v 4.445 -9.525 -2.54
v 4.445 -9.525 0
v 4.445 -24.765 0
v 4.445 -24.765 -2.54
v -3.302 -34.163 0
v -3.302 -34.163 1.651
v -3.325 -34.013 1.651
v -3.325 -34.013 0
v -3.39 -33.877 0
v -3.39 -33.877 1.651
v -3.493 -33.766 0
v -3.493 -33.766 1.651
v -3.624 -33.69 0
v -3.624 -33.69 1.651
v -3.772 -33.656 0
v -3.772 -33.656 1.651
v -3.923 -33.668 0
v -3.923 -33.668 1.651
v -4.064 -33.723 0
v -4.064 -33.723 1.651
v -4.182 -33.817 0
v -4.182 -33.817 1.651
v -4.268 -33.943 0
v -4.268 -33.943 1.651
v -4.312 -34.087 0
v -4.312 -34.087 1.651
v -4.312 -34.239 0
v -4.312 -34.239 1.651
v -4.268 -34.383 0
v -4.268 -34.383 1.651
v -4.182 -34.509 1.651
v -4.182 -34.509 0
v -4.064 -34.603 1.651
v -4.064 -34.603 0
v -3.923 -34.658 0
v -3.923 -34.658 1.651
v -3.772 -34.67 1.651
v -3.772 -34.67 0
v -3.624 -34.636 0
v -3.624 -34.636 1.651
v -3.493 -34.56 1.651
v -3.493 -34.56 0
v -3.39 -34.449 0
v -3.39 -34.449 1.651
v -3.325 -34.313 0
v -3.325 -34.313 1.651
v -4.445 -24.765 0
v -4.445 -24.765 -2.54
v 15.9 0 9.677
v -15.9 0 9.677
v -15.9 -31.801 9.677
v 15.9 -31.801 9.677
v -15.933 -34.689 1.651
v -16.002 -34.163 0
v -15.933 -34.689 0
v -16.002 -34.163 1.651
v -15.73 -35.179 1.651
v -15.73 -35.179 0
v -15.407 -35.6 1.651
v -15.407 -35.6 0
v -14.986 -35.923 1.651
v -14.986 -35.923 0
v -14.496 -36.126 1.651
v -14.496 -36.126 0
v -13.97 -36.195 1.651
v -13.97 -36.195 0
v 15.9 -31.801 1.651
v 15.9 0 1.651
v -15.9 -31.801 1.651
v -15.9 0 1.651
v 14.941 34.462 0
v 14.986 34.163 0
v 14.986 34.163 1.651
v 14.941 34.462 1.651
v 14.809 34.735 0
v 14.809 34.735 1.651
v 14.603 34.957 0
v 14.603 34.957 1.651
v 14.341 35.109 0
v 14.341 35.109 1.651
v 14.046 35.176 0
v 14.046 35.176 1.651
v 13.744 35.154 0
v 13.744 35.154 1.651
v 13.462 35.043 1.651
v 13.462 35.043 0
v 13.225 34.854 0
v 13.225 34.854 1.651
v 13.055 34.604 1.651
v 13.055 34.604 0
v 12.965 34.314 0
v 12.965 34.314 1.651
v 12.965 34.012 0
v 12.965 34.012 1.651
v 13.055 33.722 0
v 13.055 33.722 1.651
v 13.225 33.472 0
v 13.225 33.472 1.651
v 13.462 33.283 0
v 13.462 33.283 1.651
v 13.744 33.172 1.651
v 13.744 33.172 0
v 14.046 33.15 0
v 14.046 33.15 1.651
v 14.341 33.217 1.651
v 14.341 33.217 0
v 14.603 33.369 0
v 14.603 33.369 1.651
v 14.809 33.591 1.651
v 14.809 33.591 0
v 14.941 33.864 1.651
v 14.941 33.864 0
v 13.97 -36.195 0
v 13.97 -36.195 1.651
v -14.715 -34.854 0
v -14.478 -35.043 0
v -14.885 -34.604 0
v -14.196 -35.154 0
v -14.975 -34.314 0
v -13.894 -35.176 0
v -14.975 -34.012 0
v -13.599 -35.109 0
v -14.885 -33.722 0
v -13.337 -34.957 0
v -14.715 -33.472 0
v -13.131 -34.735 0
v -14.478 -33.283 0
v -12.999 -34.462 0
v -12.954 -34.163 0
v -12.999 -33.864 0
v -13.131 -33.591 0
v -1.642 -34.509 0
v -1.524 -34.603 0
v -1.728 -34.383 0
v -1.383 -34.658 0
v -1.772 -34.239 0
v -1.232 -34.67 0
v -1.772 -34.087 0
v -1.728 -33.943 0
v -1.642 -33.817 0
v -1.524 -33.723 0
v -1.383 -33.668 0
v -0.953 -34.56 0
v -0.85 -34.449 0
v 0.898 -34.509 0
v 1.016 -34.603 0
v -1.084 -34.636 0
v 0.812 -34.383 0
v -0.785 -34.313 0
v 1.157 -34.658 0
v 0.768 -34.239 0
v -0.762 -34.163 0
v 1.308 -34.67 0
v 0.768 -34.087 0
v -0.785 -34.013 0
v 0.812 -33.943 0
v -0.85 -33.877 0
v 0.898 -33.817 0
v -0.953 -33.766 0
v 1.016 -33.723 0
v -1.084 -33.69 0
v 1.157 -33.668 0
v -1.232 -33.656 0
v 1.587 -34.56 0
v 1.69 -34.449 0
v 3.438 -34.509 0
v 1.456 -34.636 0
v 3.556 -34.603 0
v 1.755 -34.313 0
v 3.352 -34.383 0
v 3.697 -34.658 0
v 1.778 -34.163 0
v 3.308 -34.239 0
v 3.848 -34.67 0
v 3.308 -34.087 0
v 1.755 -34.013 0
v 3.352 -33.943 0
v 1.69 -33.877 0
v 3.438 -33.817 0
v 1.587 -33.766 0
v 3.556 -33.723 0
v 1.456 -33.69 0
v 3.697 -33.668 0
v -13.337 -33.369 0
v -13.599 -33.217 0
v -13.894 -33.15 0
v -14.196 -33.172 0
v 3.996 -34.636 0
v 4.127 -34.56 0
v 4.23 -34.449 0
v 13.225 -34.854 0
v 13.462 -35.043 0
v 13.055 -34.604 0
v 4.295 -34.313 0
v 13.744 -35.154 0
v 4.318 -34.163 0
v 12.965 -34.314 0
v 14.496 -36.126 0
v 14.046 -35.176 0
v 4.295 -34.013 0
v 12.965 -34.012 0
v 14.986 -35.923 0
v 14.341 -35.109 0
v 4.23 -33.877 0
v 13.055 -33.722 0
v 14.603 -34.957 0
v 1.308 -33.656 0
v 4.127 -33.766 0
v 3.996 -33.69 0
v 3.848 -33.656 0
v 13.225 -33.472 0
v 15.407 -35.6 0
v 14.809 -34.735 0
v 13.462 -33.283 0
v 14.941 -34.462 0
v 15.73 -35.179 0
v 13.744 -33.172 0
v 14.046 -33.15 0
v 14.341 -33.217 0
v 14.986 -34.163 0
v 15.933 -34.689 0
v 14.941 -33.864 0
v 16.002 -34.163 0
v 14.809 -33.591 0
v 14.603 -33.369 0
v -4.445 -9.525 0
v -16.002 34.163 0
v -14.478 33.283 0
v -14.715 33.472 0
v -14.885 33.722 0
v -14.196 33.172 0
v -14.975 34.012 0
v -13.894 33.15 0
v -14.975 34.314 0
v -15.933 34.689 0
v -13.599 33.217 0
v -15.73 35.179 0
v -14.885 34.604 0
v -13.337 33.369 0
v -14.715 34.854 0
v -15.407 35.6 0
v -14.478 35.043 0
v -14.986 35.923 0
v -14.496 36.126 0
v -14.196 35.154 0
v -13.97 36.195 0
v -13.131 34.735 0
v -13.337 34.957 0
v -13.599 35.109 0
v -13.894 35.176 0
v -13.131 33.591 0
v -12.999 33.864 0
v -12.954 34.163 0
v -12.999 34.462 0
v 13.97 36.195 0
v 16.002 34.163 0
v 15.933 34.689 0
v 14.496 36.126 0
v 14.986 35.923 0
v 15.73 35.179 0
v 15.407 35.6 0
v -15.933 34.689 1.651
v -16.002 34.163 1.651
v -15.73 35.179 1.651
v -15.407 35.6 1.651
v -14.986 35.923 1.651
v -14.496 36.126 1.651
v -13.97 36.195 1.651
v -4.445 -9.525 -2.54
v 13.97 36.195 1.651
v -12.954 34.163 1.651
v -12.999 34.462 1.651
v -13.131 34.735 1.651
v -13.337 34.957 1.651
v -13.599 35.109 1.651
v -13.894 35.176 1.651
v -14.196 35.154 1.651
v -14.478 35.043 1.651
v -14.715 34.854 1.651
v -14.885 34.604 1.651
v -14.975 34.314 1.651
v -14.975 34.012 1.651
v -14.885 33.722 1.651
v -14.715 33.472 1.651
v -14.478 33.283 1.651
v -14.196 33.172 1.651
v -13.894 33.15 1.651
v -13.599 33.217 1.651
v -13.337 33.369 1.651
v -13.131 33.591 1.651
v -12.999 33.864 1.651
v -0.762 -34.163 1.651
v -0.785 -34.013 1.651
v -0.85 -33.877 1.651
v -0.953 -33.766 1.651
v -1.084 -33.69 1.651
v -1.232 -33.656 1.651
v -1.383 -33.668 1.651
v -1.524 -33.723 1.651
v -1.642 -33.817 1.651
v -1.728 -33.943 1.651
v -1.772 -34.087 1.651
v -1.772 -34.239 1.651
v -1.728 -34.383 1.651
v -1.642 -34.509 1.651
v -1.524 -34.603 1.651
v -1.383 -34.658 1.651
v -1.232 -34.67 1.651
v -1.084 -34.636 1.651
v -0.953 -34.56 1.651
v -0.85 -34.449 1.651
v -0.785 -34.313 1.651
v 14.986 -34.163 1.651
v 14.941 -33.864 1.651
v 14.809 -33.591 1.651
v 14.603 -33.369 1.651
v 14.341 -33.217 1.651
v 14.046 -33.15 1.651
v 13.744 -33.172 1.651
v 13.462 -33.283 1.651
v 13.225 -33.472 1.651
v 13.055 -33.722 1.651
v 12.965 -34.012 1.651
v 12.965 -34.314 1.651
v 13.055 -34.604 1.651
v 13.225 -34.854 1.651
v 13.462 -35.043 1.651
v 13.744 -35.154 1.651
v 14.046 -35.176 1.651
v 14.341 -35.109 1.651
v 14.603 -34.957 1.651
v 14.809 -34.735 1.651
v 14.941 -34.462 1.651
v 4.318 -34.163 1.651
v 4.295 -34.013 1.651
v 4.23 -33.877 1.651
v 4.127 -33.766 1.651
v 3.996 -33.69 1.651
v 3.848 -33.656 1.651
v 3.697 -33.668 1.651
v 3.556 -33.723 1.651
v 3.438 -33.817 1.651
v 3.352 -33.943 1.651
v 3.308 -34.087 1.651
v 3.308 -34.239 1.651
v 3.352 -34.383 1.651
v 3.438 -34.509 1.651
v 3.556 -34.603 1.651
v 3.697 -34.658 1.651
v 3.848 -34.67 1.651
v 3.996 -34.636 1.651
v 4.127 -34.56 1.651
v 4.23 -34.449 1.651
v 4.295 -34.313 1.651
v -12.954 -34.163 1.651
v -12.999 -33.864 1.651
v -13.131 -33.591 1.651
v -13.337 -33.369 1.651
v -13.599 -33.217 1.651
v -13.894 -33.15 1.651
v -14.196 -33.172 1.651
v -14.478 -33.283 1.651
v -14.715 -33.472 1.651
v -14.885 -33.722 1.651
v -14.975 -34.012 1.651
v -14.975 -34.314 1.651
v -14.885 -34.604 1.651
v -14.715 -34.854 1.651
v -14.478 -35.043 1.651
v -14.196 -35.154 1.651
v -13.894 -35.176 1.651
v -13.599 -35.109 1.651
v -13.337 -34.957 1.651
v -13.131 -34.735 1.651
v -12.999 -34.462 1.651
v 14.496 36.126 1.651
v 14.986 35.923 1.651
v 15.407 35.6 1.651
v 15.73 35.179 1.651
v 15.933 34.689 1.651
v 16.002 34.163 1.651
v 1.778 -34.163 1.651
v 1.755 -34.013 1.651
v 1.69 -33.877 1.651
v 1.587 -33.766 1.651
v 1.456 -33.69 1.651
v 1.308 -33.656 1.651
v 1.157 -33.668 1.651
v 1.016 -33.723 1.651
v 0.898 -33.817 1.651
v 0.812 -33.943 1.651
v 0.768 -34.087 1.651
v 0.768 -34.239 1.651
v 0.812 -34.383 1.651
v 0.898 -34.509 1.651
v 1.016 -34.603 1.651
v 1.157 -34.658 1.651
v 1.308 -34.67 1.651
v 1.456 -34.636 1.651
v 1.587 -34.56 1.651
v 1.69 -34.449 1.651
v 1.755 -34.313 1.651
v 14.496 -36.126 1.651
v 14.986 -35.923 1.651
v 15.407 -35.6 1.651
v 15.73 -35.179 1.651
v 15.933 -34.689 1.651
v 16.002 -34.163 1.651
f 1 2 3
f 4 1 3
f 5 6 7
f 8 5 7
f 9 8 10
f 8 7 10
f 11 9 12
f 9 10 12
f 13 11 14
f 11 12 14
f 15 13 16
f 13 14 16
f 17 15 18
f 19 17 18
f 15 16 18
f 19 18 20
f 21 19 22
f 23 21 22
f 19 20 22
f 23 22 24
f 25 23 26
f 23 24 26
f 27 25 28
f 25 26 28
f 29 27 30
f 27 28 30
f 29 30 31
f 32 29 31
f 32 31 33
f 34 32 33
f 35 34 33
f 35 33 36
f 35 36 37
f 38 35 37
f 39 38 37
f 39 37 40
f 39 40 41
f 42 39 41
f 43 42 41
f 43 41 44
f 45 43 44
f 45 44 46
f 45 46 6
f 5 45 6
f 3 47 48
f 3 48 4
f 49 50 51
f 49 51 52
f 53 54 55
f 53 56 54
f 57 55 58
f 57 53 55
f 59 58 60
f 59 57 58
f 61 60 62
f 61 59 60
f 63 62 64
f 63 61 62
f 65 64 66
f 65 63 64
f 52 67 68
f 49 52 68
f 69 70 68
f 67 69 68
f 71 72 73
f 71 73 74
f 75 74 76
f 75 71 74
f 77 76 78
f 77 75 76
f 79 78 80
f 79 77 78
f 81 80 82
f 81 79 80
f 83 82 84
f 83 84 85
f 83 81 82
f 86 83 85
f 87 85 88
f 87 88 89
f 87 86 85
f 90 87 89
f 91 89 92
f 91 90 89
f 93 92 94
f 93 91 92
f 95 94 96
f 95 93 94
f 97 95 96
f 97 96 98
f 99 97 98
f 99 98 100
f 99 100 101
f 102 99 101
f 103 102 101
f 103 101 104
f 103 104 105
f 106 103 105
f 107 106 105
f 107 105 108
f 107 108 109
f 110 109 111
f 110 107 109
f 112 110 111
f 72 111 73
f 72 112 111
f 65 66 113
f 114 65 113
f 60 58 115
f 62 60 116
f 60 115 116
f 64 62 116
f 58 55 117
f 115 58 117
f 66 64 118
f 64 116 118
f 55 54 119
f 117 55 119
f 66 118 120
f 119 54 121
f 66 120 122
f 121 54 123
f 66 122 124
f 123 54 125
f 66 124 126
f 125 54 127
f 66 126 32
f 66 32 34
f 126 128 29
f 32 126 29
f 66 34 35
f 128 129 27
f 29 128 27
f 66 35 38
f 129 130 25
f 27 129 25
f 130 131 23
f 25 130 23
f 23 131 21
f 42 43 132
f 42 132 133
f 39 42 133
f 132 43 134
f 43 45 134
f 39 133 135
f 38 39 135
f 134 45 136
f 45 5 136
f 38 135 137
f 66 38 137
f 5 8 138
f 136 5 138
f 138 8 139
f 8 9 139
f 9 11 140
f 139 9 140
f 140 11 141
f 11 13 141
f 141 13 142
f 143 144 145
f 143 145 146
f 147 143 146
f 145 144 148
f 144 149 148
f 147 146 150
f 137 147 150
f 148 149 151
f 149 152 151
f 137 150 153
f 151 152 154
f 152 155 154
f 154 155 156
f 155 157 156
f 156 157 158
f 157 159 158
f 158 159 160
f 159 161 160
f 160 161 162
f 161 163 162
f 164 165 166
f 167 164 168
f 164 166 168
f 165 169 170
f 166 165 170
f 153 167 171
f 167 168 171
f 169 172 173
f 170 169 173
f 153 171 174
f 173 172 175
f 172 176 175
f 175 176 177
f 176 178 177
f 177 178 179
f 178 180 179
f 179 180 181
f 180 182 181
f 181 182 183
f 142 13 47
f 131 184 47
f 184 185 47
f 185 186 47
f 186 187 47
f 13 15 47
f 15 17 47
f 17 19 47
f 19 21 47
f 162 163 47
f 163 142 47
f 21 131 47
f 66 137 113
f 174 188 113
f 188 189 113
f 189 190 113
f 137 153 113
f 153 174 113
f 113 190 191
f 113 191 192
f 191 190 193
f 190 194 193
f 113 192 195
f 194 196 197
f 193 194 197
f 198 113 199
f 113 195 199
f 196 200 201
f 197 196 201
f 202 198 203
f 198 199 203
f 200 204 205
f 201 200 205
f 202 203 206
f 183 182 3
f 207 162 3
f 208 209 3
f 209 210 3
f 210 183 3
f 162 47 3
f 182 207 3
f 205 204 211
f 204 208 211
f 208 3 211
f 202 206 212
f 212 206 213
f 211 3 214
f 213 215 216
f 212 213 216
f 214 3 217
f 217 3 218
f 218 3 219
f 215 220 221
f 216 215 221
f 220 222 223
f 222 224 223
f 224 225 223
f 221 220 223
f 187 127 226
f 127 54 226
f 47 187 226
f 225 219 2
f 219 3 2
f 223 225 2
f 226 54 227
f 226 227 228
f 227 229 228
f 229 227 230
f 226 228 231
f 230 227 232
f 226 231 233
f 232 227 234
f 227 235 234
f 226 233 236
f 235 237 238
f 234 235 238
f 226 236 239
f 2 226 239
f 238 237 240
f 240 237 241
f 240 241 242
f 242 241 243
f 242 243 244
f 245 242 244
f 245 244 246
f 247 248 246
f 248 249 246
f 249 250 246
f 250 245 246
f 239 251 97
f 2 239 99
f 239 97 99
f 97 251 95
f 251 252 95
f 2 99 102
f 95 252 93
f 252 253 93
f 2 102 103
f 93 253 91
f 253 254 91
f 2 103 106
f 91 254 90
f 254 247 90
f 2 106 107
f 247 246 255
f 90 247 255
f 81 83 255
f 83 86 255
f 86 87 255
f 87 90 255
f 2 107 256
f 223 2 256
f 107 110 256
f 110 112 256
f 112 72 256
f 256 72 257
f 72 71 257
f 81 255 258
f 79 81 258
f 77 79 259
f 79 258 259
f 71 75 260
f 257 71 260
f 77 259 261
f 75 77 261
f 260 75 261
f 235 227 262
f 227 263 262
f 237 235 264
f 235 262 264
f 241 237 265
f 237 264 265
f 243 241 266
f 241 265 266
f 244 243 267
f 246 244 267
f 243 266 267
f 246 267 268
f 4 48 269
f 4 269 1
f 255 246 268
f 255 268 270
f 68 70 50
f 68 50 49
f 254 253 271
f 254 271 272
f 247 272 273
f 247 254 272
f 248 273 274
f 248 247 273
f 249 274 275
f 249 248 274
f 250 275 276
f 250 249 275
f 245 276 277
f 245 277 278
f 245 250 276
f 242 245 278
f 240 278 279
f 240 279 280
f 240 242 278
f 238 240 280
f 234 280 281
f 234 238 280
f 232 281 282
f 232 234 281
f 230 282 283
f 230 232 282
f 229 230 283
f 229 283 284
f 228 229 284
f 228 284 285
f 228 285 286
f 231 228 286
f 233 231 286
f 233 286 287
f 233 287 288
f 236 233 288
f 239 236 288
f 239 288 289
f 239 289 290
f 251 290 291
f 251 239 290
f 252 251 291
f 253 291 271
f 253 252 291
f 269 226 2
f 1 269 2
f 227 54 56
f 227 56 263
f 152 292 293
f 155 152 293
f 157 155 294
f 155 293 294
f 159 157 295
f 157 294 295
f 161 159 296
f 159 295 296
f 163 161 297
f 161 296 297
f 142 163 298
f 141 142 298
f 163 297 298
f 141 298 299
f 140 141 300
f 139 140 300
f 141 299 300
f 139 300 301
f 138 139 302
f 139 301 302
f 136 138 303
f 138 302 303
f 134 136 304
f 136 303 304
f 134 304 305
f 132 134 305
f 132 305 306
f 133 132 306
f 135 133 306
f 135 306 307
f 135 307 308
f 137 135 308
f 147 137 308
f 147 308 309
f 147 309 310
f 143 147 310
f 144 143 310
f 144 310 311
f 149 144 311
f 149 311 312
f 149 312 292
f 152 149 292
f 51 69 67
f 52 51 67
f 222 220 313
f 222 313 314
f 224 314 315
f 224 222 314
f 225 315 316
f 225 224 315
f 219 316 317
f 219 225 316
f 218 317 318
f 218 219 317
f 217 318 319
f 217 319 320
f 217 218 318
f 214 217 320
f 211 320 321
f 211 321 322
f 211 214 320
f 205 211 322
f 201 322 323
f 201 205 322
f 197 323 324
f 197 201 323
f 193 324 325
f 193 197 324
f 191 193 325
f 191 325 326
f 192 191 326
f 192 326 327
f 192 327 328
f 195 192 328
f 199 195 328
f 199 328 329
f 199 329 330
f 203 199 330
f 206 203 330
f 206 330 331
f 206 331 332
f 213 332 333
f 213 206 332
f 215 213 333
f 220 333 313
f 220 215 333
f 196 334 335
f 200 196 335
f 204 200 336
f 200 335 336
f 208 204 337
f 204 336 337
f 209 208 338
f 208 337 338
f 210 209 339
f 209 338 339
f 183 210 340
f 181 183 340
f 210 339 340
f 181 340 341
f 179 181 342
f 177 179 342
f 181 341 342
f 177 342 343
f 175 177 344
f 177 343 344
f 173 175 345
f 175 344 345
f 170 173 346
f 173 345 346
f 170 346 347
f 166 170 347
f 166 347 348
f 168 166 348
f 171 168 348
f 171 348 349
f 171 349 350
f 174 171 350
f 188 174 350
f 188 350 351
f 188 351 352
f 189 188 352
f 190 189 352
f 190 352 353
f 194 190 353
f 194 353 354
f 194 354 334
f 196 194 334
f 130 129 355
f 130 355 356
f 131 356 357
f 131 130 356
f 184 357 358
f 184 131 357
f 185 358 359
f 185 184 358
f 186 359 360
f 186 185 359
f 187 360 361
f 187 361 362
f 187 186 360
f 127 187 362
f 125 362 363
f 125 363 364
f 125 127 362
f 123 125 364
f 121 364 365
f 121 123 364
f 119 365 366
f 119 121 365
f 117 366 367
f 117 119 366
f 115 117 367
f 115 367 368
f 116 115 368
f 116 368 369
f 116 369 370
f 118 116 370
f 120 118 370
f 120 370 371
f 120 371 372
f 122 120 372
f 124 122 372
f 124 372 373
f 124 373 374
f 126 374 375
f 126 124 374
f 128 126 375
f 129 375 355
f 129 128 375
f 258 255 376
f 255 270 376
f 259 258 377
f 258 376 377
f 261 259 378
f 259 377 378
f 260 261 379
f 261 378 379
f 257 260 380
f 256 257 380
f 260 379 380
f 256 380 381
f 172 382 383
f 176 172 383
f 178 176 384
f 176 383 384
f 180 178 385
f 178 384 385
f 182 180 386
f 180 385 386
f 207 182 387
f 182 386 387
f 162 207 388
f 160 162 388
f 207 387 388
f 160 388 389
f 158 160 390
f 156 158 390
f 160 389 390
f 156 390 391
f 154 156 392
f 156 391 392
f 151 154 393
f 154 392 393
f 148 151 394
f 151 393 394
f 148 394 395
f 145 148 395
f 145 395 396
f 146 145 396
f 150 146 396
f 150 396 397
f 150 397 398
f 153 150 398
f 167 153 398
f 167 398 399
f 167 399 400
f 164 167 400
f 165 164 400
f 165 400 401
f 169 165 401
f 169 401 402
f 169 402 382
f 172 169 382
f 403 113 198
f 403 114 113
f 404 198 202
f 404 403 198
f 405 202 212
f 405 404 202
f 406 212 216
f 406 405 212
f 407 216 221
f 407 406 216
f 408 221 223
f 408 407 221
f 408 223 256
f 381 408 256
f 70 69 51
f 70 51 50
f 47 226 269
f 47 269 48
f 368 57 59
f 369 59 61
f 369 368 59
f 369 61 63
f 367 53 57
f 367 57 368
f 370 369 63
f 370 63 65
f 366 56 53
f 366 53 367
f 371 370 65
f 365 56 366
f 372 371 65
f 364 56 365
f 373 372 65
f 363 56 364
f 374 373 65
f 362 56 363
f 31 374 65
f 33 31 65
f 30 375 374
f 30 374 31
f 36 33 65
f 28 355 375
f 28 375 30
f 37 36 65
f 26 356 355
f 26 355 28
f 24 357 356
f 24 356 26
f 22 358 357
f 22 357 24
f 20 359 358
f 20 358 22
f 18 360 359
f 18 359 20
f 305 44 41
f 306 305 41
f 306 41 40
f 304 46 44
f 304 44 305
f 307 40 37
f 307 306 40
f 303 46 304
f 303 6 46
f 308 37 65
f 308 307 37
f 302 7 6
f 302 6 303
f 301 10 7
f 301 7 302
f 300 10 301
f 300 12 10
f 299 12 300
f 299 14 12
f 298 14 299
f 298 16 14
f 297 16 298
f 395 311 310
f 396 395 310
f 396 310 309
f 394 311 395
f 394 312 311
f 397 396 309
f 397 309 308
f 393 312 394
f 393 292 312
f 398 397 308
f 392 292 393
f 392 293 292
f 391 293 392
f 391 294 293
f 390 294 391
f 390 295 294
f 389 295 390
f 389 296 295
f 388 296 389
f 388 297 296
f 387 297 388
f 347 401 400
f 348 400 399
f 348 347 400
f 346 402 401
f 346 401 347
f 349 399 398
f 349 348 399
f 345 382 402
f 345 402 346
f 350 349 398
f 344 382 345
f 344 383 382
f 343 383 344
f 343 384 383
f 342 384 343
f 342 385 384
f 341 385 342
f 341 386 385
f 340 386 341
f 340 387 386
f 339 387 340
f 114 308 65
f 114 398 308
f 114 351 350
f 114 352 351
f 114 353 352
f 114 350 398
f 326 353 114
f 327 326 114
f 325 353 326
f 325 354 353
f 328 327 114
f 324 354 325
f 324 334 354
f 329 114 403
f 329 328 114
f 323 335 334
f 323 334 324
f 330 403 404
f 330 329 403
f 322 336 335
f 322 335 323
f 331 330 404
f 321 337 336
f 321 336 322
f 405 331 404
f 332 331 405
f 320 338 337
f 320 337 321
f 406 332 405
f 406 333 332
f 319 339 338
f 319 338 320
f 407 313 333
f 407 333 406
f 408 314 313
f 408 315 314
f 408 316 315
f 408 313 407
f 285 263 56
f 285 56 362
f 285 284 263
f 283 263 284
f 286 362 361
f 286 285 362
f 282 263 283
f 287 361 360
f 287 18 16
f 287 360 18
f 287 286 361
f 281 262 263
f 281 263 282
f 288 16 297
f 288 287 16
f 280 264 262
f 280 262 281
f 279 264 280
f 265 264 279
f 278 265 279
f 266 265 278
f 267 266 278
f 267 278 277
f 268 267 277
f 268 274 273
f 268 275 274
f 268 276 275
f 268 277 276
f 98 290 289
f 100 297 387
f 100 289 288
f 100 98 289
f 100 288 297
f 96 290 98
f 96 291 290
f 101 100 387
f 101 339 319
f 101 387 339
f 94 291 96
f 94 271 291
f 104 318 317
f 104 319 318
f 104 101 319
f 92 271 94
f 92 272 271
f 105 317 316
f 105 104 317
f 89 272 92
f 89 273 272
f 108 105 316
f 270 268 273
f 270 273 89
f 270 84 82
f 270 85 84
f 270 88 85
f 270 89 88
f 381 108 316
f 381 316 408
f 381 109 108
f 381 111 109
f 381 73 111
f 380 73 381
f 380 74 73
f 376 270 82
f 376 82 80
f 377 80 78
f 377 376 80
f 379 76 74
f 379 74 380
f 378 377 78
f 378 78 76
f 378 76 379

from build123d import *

# Parameters (mm, degrees)
F0_W     = 32.004
F0_H     = 72.39
F0_R     = 1.016
F1_DEPTH = 1.651
F2_W     = 31.8008
F2_H     = 31.8008
F3_DEPTH = 8.0264
F4_R     = 2.032
F5_R     = 0.508
F6_DEPTH = 1.652
F7_W     = 8.89
F7_H     = 15.24
F8_DEPTH = 2.54


with BuildPart() as f1:
    # F0 (on Top) → F1 (new body)
    with BuildSketch(Plane.XY):
        Rectangle(F0_W, F0_H)
        with Locations((-13.97, -34.163)):
            Circle(F0_R, mode=Mode.SUBTRACT)
        with Locations((13.97, -34.163)):
            Circle(F0_R, mode=Mode.SUBTRACT)
        with Locations((-13.97, 34.163)):
            Circle(F0_R, mode=Mode.SUBTRACT)
        with Locations((13.97, 34.163)):
            Circle(F0_R, mode=Mode.SUBTRACT)
    extrude(amount=F1_DEPTH)

    # F4
    f4_edges = [f1.edges().sort_by_distance(p)[0] for p in [
        (16.002, -36.195, 0.8255),
        (-16.002, -36.195, 0.8255),
        (-16.002, 36.195, 0.8255),
        (16.002, 36.195, 0.8255),
    ]]
    fillet(f4_edges, radius=F4_R)

    # F5 (on face) → F6 (cut, through all)
    with BuildSketch(Plane.XY.offset(1.651)):
        with Locations((3.81, -34.163)):
            Circle(F5_R)
        with Locations((1.27, -34.163)):
            Circle(F5_R)
        with Locations((-1.27, -34.163)):
            Circle(F5_R)
        with Locations((-3.81, -34.163)):
            Circle(F5_R)
    extrude(amount=-F6_DEPTH, mode=Mode.SUBTRACT)

    # F7 (on face) → F8 (join)
    with BuildSketch(Plane(origin=(0, 0, 0), x_dir=(1, 0, 0), z_dir=(0, 0, -1))):
        with Locations((0, 17.145)):
            Rectangle(F7_W, F7_H)
    extrude(amount=F8_DEPTH)


with BuildPart() as f3:
    # F2 (on face) → F3 (new body)
    with BuildSketch(Plane.XY.offset(1.651)):
        with Locations((0, -15.9004)):
            Rectangle(F2_W, F2_H)
    extrude(amount=F3_DEPTH)


solid = Compound([f1.part, f3.part])
